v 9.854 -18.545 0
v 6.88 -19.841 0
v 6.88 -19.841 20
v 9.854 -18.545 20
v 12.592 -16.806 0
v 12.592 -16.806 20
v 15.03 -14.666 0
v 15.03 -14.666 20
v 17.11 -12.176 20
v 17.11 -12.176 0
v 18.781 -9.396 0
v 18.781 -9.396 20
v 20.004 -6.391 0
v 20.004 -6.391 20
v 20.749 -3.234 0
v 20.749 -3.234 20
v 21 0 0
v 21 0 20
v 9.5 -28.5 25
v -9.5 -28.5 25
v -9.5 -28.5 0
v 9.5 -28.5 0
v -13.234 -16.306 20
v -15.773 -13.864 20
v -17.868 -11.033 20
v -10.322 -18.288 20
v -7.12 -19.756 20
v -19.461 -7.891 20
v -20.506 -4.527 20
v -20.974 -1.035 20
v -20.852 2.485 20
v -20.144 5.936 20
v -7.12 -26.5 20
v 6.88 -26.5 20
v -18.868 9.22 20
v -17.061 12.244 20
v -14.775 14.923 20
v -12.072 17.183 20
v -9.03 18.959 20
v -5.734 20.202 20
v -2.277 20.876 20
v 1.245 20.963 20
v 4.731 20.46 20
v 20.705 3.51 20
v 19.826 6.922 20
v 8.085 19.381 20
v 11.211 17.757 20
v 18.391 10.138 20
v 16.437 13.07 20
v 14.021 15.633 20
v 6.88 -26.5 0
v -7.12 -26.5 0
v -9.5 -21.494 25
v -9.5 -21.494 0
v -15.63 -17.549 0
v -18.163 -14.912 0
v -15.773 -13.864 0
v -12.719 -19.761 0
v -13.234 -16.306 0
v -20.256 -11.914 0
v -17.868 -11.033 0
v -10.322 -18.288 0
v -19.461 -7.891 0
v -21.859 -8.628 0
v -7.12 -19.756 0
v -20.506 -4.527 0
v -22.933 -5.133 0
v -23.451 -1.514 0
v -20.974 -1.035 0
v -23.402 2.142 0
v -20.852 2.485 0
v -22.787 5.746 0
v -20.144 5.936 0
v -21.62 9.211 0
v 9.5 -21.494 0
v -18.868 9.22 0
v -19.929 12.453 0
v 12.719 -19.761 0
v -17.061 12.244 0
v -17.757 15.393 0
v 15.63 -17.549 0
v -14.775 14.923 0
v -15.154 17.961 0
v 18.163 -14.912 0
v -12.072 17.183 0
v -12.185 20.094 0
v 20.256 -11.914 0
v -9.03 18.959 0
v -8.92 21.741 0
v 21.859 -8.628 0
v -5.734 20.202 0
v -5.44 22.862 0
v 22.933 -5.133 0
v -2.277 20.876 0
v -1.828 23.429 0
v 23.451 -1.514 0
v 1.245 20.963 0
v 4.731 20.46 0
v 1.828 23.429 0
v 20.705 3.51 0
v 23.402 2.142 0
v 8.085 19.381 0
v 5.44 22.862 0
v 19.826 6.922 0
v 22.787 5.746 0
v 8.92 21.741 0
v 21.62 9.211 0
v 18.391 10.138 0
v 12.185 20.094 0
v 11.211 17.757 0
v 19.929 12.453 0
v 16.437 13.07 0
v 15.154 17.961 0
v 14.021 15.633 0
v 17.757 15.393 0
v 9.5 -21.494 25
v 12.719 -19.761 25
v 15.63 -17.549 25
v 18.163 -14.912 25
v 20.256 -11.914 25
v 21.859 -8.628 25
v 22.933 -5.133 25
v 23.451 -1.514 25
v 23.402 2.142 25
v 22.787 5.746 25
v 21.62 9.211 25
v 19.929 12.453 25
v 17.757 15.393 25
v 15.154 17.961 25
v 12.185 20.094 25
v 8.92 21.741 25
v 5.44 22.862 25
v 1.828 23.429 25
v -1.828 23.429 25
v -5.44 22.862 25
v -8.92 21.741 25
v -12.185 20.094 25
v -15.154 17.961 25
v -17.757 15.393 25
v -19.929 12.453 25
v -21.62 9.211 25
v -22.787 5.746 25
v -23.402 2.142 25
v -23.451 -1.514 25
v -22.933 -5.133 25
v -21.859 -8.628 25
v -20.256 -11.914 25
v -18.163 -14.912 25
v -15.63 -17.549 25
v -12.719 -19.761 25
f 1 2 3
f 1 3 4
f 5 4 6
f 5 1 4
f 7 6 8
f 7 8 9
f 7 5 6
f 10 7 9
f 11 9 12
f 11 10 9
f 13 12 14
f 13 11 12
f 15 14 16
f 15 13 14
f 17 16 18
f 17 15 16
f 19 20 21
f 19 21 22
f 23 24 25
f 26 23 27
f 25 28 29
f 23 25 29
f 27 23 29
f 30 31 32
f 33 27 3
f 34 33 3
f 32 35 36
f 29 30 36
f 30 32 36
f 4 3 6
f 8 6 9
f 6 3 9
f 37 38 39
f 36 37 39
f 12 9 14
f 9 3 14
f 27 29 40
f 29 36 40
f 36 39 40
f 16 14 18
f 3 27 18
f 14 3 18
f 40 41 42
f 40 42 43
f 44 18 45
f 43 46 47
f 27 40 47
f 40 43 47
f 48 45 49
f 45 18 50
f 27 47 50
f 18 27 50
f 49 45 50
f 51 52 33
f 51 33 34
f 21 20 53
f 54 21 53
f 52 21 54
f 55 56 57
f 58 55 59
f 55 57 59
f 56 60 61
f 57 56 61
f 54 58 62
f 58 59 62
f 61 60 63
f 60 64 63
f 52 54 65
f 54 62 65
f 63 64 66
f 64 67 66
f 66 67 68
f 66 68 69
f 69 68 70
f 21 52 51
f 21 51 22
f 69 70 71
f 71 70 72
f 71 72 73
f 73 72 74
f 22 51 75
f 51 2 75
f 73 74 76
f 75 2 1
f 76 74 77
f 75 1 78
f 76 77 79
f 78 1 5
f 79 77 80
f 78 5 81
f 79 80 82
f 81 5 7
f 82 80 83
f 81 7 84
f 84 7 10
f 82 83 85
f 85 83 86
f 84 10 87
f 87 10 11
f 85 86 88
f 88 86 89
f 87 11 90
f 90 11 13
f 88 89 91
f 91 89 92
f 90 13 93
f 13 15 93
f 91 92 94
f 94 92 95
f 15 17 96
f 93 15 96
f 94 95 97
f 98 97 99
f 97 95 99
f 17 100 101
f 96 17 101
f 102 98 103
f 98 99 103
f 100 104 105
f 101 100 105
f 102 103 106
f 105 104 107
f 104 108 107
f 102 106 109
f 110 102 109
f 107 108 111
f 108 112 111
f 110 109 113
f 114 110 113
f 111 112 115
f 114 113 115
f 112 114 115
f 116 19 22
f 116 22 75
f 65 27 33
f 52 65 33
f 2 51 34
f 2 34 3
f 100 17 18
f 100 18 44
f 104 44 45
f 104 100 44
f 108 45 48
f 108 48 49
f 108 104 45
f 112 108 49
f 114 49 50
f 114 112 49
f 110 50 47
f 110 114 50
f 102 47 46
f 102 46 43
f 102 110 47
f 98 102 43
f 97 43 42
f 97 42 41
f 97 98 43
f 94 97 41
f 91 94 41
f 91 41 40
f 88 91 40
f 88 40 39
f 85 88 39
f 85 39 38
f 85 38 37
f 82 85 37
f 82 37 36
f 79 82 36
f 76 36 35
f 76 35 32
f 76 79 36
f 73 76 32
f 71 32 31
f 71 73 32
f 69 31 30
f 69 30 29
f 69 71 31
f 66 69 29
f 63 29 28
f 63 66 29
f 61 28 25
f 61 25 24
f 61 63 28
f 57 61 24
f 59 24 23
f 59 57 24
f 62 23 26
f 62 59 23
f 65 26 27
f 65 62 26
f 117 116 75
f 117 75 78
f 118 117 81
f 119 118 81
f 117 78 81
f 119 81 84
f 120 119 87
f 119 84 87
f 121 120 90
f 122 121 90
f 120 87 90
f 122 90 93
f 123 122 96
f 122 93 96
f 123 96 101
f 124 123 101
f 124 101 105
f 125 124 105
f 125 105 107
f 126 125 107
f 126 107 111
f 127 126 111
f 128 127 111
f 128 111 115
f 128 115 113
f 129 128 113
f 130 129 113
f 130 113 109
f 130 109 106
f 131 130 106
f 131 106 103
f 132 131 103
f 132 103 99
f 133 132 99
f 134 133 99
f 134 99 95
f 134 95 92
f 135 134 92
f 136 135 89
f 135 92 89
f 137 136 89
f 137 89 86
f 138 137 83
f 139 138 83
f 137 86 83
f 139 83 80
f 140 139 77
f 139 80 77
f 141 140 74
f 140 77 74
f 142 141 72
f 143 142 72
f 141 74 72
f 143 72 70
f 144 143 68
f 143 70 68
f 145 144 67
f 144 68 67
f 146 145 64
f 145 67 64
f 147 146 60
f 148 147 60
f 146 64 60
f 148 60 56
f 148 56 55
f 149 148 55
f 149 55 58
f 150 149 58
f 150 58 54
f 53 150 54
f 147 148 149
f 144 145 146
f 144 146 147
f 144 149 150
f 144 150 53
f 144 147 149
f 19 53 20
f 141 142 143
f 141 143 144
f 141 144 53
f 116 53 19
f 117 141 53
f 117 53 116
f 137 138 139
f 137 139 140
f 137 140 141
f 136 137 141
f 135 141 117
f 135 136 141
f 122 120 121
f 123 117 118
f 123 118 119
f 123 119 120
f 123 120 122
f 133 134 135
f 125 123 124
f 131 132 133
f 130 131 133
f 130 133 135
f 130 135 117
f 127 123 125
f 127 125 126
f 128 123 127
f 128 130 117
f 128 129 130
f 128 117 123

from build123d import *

# Parameters (mm, degrees)
F0_R     = 23.5
F1_DEPTH = 25
F2_W     = 19
F2_H     = 10
F3_DEPTH = 25
F5_DEPTH = 20


# Not quite as in the source:
# - a feature names something its author has since deleted; it is built from what else it names


with BuildPart() as f1:
    # F0 (on Top) → F1 (new body)
    with BuildSketch(Plane.XY):
        Circle(F0_R)
    extrude(amount=F1_DEPTH)

    # F2 (on face) → F3 (join)
    with BuildSketch(Plane.XY.offset(25)):
        with Locations((0, -23.5)):
            Rectangle(F2_W, F2_H)
    extrude(amount=-F3_DEPTH)

    # F4 (on Top) → F5 (cut)
    with BuildSketch(Plane.XY):
        with BuildLine():
            Line((-0.1196338324, -26.5), (-0.094803203, -20.9997860073))
            ThreePointArc((-0.094803203, -20.9997860073), (-3.6604096567, -20.6785251202), (-7.1196338324, -19.7562854325))
            Line((-7.1196338324, -19.7562854325), (-7.1196338324, -26.5))
            Line((-7.1196338324, -26.5), (-0.1196338324, -26.5))
        make_face()
        with BuildLine():
            ThreePointArc((6.8803661676, -19.8408810641), (3.4419080977, -20.7160147868), (-0.094803203, -20.9997860073))
            Line((-0.094803203, -20.9997860073), (-0.1196338324, -26.5))
            Line((-0.1196338324, -26.5), (6.8803661676, -26.5))
            Line((6.8803661676, -26.5), (6.8803661676, -19.8408810641))
        make_face()
        with BuildLine():
            ThreePointArc((-7.1196338324, -19.7562854325), (-3.6604096567, -20.6785251202), (-0.094803203, -20.9997860073))
            ThreePointArc((-0.094803203, -20.9997860073), (3.4419080977, -20.7160147868), (6.8803661676, -19.8408810641))
            ThreePointArc((6.8803661676, -19.8408810641), (17.1097587581, -12.1760484247), (21, 0))
            ThreePointArc((21, 0), (-12.0724415409, 17.1830193866), (-7.1196338324, -19.7562854325))
        make_face()
    extrude(amount=F5_DEPTH, mode=Mode.SUBTRACT)


solid = f1.part
